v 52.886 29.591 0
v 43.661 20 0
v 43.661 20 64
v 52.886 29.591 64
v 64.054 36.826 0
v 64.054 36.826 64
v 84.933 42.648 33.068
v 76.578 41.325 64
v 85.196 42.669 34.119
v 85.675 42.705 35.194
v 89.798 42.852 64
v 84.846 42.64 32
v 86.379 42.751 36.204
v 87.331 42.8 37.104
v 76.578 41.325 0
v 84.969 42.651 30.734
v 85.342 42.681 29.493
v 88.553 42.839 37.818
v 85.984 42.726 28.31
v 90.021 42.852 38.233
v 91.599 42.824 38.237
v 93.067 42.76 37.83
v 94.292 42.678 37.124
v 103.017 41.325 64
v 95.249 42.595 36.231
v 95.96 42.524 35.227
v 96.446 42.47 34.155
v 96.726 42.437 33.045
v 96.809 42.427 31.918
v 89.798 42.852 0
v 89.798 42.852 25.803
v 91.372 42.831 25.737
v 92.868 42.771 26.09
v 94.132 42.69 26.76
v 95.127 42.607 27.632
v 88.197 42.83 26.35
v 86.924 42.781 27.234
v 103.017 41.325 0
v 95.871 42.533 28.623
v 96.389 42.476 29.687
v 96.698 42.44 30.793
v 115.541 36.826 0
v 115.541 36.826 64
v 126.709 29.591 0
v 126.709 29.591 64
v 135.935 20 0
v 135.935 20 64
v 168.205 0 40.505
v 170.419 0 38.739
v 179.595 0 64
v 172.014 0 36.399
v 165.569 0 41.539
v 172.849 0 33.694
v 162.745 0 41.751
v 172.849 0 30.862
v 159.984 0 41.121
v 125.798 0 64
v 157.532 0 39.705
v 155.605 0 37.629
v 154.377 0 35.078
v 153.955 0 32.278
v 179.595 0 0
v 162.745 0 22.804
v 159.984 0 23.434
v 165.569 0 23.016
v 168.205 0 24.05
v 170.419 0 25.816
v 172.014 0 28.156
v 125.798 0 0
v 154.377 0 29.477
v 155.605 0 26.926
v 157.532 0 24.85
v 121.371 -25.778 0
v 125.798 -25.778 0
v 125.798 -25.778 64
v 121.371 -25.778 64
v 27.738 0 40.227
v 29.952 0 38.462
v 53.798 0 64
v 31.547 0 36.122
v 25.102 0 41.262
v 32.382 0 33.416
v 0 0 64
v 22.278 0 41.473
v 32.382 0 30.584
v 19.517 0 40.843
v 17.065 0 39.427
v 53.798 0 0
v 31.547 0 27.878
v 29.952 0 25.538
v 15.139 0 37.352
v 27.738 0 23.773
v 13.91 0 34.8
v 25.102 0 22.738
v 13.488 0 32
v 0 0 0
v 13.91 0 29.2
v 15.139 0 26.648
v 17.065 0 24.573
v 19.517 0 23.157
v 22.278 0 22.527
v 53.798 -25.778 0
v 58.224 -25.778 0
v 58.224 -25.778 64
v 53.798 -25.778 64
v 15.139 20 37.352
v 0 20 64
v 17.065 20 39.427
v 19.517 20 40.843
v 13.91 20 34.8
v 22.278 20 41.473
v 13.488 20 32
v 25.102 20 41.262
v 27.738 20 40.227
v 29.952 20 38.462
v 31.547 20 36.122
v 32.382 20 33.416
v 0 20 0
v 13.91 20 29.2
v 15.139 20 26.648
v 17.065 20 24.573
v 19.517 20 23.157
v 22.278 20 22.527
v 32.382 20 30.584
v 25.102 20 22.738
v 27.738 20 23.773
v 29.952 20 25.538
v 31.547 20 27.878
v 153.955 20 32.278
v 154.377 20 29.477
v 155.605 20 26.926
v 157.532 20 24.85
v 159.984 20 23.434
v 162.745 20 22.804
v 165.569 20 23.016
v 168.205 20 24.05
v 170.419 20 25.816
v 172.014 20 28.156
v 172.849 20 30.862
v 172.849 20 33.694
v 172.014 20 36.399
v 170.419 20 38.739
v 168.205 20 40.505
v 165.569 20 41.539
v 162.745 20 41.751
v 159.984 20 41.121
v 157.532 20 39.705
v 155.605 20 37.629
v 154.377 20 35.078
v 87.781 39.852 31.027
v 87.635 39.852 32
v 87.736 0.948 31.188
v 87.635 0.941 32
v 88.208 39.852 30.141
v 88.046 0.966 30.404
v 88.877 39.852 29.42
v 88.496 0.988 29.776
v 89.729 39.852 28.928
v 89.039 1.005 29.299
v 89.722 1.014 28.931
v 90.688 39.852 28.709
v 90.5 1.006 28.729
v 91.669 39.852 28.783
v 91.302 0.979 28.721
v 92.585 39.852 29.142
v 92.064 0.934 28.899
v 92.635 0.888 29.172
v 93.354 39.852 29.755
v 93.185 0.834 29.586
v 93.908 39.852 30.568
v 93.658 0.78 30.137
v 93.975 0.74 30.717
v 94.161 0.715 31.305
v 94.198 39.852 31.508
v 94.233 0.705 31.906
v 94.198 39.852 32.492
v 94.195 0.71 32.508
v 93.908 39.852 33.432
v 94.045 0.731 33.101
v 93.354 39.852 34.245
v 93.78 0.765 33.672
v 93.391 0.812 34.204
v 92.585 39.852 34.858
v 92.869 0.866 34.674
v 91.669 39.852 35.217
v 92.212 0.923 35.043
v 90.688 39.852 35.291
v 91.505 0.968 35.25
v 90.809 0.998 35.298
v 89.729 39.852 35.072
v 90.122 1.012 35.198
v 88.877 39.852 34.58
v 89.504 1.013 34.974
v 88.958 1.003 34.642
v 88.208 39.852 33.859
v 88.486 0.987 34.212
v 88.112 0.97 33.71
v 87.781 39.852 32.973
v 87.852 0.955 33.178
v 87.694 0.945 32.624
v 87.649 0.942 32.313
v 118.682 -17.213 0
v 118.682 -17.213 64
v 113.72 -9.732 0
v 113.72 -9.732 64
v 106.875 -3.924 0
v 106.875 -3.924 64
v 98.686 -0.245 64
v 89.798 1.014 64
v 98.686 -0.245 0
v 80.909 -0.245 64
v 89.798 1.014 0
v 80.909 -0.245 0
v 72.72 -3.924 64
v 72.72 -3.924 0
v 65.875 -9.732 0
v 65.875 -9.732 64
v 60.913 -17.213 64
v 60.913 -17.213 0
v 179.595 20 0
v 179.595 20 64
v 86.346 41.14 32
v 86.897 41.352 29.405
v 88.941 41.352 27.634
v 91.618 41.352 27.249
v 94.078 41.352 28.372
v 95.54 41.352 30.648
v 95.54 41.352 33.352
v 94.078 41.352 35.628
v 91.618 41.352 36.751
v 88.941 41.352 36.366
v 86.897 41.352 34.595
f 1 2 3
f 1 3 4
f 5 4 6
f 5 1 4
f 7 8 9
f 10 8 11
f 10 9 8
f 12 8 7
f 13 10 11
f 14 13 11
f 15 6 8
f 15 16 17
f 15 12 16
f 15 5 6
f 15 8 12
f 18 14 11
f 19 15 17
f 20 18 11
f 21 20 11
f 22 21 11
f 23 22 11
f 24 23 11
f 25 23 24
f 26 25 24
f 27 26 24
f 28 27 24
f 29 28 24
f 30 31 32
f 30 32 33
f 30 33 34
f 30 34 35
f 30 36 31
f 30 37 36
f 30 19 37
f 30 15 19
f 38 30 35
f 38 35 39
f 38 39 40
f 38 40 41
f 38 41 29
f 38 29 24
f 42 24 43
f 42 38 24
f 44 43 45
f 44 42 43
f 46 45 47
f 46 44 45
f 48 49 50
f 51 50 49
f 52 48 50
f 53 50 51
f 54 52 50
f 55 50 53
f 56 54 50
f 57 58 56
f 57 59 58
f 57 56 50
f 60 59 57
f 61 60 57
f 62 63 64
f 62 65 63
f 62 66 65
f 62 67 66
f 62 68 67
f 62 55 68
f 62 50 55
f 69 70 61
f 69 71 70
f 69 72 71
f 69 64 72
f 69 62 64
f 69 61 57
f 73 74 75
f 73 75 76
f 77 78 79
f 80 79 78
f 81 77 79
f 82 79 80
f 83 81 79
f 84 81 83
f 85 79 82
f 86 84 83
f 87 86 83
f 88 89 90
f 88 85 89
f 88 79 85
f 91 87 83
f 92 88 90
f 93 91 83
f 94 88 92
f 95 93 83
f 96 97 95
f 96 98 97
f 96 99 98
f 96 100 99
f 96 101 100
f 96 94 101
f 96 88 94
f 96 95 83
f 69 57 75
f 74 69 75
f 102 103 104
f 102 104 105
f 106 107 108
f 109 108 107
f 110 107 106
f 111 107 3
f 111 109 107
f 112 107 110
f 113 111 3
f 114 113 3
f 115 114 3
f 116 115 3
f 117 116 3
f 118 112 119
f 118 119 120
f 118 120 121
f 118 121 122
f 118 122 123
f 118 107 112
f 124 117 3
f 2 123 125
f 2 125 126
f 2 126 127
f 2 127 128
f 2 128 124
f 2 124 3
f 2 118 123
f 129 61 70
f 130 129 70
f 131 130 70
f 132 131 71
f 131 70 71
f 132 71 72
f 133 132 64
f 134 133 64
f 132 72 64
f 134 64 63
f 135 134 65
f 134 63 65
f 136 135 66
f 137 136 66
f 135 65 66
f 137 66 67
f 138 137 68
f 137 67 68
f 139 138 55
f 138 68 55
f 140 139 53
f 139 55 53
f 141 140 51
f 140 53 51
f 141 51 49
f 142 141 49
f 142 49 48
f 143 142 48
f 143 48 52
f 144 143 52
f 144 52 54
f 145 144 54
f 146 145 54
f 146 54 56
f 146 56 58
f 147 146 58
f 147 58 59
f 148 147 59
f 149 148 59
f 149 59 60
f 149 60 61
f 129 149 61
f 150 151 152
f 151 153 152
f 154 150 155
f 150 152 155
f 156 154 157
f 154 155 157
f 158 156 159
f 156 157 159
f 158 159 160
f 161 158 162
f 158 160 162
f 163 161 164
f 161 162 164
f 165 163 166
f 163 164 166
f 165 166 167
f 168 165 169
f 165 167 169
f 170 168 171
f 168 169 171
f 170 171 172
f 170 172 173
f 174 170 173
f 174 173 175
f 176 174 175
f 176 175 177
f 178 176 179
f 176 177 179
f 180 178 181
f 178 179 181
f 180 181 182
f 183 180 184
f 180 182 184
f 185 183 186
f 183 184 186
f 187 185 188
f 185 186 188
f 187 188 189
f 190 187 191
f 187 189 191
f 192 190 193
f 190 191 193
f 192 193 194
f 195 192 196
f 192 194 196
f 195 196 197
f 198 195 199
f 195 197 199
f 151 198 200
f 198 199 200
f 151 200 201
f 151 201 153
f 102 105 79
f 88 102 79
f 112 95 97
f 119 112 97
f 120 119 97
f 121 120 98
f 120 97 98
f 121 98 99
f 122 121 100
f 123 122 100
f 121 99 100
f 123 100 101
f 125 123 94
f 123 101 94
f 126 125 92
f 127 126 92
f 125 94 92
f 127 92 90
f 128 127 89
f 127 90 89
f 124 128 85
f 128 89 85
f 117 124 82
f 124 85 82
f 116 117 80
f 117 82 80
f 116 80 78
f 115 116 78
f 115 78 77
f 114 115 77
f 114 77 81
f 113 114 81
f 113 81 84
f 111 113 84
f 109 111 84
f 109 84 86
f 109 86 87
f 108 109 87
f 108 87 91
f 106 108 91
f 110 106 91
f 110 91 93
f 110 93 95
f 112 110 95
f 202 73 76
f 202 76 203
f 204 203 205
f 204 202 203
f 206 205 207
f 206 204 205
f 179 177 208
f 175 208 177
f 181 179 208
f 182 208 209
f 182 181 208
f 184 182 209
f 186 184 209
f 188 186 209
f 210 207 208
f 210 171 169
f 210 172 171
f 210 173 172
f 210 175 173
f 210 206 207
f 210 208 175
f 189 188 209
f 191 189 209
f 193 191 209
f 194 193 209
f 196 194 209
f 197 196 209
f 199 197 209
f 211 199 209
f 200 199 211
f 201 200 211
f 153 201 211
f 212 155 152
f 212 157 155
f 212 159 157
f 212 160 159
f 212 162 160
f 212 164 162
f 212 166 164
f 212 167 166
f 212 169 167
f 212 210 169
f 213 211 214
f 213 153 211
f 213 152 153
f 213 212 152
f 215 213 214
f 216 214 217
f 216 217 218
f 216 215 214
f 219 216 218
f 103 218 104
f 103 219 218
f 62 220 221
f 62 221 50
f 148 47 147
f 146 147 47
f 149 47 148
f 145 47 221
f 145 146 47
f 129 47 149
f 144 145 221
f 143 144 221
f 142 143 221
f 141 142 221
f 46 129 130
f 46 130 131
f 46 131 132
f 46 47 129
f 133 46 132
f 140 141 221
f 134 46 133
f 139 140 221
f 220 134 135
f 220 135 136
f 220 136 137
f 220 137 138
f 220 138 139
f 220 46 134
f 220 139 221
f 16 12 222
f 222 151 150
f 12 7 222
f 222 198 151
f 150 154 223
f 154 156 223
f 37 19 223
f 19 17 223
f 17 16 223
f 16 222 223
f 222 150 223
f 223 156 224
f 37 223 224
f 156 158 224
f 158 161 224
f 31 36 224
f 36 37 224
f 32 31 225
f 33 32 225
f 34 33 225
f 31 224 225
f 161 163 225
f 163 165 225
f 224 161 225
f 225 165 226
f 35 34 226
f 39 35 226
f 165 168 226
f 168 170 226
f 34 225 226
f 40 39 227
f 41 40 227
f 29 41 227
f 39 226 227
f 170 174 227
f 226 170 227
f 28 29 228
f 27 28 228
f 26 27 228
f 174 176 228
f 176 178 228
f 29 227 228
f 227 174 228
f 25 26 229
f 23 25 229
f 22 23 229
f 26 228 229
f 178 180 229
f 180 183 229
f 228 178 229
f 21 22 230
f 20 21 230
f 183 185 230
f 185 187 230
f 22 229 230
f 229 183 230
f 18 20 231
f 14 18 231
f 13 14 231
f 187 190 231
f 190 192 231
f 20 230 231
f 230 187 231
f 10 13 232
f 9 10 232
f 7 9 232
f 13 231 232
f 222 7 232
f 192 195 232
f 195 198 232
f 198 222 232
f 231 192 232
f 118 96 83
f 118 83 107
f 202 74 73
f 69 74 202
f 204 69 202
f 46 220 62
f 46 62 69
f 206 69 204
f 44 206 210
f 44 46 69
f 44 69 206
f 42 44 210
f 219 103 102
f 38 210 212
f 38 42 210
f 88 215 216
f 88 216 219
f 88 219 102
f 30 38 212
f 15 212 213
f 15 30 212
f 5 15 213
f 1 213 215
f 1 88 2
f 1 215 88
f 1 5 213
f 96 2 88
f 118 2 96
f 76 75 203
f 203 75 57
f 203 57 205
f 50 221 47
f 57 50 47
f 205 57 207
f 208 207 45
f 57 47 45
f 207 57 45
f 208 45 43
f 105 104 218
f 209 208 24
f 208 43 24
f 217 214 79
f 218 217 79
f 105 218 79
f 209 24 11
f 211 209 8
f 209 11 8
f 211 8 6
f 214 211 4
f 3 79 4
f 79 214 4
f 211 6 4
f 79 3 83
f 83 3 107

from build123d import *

# Parameters (mm, degrees)
BOSS_EXTRUDE1_DEPTH                                 = 64
F_1_0MM_DOWEL_HOLE1_D                               = 19
F_1_0MM_DOWEL_HOLE1_DEPTH                           = 130
F_1_0MM_DOWEL_HOLE1_TIP                             = 5.708175881
CSK_FOR_M6_COUNTERSUNK_FLAT_HEAD_SCREW1_D           = 6.6
CSK_FOR_M6_COUNTERSUNK_FLAT_HEAD_SCREW1_DEPTH       = 130
CSK_FOR_M6_COUNTERSUNK_FLAT_HEAD_SCREW1_CSINK_D     = 12.6
CSK_FOR_M6_COUNTERSUNK_FLAT_HEAD_SCREW1_CSINK_ANGLE = 90
CSK_FOR_M6_COUNTERSUNK_FLAT_HEAD_SCREW1_TIP         = 1.982840043


with BuildPart() as part:
    # Sketch1 → Boss-Extrude1 (new body)
    with BuildSketch(Plane.XY):
        with BuildLine():
            Line((0, 0), (0, 20))
            Line((0, 20), (43.660658251, 20))
            ThreePointArc((43.660658251, 20), (89.797593381, 42.851981325), (135.934528511, 20))
            Line((135.934528511, 20), (179.595186762, 20))
            Line((179.595186762, 20), (179.595186762, 0))
            Line((179.595186762, 0), (125.797593381, 0))
            Line((125.797593381, 0), (125.797593381, -25.778358914))
            Line((125.797593381, -25.778358914), (121.37101897, -25.778358914))
            ThreePointArc((121.37101897, -25.778358914), (89.797593381, 1.014070006), (58.224167792, -25.778358914))
            Line((58.224167792, -25.778358914), (53.797593381, -25.778358914))
            Line((53.797593381, -25.778358914), (53.797593381, 0))
            Line((53.797593381, 0), (0, 0))
        make_face()
    extrude(amount=BOSS_EXTRUDE1_DEPTH)

    # Ø1.0mm Dowel Hole1
    with Locations(Plane(origin=(0, 20, 0), x_dir=(1, 0, 0), z_dir=(0, 1, 0))):
        with Locations((22.988007273, -32), (163.454699395, -32.277602158)):
            Hole(F_1_0MM_DOWEL_HOLE1_D / 2, depth=F_1_0MM_DOWEL_HOLE1_DEPTH)
            with Locations((0, 0, -(F_1_0MM_DOWEL_HOLE1_DEPTH + F_1_0MM_DOWEL_HOLE1_TIP / 2))):  # 118° drill point
                Cone(0, F_1_0MM_DOWEL_HOLE1_D / 2, F_1_0MM_DOWEL_HOLE1_TIP, mode=Mode.SUBTRACT)

    # CSK for M6 Countersunk Flat Head Screw1
    with Locations(Plane(origin=(0, 42.851981325, 0), x_dir=(1, 0, 0), z_dir=(0, 1, 0))):
        with Locations((90.934528511, -32)):
            CounterSinkHole(CSK_FOR_M6_COUNTERSUNK_FLAT_HEAD_SCREW1_D / 2, CSK_FOR_M6_COUNTERSUNK_FLAT_HEAD_SCREW1_CSINK_D / 2, depth=CSK_FOR_M6_COUNTERSUNK_FLAT_HEAD_SCREW1_DEPTH, counter_sink_angle=CSK_FOR_M6_COUNTERSUNK_FLAT_HEAD_SCREW1_CSINK_ANGLE)
            with Locations((0, 0, -(CSK_FOR_M6_COUNTERSUNK_FLAT_HEAD_SCREW1_DEPTH + CSK_FOR_M6_COUNTERSUNK_FLAT_HEAD_SCREW1_TIP / 2))):  # 118° drill point
                Cone(0, CSK_FOR_M6_COUNTERSUNK_FLAT_HEAD_SCREW1_D / 2, CSK_FOR_M6_COUNTERSUNK_FLAT_HEAD_SCREW1_TIP, mode=Mode.SUBTRACT)


solid = part.part
